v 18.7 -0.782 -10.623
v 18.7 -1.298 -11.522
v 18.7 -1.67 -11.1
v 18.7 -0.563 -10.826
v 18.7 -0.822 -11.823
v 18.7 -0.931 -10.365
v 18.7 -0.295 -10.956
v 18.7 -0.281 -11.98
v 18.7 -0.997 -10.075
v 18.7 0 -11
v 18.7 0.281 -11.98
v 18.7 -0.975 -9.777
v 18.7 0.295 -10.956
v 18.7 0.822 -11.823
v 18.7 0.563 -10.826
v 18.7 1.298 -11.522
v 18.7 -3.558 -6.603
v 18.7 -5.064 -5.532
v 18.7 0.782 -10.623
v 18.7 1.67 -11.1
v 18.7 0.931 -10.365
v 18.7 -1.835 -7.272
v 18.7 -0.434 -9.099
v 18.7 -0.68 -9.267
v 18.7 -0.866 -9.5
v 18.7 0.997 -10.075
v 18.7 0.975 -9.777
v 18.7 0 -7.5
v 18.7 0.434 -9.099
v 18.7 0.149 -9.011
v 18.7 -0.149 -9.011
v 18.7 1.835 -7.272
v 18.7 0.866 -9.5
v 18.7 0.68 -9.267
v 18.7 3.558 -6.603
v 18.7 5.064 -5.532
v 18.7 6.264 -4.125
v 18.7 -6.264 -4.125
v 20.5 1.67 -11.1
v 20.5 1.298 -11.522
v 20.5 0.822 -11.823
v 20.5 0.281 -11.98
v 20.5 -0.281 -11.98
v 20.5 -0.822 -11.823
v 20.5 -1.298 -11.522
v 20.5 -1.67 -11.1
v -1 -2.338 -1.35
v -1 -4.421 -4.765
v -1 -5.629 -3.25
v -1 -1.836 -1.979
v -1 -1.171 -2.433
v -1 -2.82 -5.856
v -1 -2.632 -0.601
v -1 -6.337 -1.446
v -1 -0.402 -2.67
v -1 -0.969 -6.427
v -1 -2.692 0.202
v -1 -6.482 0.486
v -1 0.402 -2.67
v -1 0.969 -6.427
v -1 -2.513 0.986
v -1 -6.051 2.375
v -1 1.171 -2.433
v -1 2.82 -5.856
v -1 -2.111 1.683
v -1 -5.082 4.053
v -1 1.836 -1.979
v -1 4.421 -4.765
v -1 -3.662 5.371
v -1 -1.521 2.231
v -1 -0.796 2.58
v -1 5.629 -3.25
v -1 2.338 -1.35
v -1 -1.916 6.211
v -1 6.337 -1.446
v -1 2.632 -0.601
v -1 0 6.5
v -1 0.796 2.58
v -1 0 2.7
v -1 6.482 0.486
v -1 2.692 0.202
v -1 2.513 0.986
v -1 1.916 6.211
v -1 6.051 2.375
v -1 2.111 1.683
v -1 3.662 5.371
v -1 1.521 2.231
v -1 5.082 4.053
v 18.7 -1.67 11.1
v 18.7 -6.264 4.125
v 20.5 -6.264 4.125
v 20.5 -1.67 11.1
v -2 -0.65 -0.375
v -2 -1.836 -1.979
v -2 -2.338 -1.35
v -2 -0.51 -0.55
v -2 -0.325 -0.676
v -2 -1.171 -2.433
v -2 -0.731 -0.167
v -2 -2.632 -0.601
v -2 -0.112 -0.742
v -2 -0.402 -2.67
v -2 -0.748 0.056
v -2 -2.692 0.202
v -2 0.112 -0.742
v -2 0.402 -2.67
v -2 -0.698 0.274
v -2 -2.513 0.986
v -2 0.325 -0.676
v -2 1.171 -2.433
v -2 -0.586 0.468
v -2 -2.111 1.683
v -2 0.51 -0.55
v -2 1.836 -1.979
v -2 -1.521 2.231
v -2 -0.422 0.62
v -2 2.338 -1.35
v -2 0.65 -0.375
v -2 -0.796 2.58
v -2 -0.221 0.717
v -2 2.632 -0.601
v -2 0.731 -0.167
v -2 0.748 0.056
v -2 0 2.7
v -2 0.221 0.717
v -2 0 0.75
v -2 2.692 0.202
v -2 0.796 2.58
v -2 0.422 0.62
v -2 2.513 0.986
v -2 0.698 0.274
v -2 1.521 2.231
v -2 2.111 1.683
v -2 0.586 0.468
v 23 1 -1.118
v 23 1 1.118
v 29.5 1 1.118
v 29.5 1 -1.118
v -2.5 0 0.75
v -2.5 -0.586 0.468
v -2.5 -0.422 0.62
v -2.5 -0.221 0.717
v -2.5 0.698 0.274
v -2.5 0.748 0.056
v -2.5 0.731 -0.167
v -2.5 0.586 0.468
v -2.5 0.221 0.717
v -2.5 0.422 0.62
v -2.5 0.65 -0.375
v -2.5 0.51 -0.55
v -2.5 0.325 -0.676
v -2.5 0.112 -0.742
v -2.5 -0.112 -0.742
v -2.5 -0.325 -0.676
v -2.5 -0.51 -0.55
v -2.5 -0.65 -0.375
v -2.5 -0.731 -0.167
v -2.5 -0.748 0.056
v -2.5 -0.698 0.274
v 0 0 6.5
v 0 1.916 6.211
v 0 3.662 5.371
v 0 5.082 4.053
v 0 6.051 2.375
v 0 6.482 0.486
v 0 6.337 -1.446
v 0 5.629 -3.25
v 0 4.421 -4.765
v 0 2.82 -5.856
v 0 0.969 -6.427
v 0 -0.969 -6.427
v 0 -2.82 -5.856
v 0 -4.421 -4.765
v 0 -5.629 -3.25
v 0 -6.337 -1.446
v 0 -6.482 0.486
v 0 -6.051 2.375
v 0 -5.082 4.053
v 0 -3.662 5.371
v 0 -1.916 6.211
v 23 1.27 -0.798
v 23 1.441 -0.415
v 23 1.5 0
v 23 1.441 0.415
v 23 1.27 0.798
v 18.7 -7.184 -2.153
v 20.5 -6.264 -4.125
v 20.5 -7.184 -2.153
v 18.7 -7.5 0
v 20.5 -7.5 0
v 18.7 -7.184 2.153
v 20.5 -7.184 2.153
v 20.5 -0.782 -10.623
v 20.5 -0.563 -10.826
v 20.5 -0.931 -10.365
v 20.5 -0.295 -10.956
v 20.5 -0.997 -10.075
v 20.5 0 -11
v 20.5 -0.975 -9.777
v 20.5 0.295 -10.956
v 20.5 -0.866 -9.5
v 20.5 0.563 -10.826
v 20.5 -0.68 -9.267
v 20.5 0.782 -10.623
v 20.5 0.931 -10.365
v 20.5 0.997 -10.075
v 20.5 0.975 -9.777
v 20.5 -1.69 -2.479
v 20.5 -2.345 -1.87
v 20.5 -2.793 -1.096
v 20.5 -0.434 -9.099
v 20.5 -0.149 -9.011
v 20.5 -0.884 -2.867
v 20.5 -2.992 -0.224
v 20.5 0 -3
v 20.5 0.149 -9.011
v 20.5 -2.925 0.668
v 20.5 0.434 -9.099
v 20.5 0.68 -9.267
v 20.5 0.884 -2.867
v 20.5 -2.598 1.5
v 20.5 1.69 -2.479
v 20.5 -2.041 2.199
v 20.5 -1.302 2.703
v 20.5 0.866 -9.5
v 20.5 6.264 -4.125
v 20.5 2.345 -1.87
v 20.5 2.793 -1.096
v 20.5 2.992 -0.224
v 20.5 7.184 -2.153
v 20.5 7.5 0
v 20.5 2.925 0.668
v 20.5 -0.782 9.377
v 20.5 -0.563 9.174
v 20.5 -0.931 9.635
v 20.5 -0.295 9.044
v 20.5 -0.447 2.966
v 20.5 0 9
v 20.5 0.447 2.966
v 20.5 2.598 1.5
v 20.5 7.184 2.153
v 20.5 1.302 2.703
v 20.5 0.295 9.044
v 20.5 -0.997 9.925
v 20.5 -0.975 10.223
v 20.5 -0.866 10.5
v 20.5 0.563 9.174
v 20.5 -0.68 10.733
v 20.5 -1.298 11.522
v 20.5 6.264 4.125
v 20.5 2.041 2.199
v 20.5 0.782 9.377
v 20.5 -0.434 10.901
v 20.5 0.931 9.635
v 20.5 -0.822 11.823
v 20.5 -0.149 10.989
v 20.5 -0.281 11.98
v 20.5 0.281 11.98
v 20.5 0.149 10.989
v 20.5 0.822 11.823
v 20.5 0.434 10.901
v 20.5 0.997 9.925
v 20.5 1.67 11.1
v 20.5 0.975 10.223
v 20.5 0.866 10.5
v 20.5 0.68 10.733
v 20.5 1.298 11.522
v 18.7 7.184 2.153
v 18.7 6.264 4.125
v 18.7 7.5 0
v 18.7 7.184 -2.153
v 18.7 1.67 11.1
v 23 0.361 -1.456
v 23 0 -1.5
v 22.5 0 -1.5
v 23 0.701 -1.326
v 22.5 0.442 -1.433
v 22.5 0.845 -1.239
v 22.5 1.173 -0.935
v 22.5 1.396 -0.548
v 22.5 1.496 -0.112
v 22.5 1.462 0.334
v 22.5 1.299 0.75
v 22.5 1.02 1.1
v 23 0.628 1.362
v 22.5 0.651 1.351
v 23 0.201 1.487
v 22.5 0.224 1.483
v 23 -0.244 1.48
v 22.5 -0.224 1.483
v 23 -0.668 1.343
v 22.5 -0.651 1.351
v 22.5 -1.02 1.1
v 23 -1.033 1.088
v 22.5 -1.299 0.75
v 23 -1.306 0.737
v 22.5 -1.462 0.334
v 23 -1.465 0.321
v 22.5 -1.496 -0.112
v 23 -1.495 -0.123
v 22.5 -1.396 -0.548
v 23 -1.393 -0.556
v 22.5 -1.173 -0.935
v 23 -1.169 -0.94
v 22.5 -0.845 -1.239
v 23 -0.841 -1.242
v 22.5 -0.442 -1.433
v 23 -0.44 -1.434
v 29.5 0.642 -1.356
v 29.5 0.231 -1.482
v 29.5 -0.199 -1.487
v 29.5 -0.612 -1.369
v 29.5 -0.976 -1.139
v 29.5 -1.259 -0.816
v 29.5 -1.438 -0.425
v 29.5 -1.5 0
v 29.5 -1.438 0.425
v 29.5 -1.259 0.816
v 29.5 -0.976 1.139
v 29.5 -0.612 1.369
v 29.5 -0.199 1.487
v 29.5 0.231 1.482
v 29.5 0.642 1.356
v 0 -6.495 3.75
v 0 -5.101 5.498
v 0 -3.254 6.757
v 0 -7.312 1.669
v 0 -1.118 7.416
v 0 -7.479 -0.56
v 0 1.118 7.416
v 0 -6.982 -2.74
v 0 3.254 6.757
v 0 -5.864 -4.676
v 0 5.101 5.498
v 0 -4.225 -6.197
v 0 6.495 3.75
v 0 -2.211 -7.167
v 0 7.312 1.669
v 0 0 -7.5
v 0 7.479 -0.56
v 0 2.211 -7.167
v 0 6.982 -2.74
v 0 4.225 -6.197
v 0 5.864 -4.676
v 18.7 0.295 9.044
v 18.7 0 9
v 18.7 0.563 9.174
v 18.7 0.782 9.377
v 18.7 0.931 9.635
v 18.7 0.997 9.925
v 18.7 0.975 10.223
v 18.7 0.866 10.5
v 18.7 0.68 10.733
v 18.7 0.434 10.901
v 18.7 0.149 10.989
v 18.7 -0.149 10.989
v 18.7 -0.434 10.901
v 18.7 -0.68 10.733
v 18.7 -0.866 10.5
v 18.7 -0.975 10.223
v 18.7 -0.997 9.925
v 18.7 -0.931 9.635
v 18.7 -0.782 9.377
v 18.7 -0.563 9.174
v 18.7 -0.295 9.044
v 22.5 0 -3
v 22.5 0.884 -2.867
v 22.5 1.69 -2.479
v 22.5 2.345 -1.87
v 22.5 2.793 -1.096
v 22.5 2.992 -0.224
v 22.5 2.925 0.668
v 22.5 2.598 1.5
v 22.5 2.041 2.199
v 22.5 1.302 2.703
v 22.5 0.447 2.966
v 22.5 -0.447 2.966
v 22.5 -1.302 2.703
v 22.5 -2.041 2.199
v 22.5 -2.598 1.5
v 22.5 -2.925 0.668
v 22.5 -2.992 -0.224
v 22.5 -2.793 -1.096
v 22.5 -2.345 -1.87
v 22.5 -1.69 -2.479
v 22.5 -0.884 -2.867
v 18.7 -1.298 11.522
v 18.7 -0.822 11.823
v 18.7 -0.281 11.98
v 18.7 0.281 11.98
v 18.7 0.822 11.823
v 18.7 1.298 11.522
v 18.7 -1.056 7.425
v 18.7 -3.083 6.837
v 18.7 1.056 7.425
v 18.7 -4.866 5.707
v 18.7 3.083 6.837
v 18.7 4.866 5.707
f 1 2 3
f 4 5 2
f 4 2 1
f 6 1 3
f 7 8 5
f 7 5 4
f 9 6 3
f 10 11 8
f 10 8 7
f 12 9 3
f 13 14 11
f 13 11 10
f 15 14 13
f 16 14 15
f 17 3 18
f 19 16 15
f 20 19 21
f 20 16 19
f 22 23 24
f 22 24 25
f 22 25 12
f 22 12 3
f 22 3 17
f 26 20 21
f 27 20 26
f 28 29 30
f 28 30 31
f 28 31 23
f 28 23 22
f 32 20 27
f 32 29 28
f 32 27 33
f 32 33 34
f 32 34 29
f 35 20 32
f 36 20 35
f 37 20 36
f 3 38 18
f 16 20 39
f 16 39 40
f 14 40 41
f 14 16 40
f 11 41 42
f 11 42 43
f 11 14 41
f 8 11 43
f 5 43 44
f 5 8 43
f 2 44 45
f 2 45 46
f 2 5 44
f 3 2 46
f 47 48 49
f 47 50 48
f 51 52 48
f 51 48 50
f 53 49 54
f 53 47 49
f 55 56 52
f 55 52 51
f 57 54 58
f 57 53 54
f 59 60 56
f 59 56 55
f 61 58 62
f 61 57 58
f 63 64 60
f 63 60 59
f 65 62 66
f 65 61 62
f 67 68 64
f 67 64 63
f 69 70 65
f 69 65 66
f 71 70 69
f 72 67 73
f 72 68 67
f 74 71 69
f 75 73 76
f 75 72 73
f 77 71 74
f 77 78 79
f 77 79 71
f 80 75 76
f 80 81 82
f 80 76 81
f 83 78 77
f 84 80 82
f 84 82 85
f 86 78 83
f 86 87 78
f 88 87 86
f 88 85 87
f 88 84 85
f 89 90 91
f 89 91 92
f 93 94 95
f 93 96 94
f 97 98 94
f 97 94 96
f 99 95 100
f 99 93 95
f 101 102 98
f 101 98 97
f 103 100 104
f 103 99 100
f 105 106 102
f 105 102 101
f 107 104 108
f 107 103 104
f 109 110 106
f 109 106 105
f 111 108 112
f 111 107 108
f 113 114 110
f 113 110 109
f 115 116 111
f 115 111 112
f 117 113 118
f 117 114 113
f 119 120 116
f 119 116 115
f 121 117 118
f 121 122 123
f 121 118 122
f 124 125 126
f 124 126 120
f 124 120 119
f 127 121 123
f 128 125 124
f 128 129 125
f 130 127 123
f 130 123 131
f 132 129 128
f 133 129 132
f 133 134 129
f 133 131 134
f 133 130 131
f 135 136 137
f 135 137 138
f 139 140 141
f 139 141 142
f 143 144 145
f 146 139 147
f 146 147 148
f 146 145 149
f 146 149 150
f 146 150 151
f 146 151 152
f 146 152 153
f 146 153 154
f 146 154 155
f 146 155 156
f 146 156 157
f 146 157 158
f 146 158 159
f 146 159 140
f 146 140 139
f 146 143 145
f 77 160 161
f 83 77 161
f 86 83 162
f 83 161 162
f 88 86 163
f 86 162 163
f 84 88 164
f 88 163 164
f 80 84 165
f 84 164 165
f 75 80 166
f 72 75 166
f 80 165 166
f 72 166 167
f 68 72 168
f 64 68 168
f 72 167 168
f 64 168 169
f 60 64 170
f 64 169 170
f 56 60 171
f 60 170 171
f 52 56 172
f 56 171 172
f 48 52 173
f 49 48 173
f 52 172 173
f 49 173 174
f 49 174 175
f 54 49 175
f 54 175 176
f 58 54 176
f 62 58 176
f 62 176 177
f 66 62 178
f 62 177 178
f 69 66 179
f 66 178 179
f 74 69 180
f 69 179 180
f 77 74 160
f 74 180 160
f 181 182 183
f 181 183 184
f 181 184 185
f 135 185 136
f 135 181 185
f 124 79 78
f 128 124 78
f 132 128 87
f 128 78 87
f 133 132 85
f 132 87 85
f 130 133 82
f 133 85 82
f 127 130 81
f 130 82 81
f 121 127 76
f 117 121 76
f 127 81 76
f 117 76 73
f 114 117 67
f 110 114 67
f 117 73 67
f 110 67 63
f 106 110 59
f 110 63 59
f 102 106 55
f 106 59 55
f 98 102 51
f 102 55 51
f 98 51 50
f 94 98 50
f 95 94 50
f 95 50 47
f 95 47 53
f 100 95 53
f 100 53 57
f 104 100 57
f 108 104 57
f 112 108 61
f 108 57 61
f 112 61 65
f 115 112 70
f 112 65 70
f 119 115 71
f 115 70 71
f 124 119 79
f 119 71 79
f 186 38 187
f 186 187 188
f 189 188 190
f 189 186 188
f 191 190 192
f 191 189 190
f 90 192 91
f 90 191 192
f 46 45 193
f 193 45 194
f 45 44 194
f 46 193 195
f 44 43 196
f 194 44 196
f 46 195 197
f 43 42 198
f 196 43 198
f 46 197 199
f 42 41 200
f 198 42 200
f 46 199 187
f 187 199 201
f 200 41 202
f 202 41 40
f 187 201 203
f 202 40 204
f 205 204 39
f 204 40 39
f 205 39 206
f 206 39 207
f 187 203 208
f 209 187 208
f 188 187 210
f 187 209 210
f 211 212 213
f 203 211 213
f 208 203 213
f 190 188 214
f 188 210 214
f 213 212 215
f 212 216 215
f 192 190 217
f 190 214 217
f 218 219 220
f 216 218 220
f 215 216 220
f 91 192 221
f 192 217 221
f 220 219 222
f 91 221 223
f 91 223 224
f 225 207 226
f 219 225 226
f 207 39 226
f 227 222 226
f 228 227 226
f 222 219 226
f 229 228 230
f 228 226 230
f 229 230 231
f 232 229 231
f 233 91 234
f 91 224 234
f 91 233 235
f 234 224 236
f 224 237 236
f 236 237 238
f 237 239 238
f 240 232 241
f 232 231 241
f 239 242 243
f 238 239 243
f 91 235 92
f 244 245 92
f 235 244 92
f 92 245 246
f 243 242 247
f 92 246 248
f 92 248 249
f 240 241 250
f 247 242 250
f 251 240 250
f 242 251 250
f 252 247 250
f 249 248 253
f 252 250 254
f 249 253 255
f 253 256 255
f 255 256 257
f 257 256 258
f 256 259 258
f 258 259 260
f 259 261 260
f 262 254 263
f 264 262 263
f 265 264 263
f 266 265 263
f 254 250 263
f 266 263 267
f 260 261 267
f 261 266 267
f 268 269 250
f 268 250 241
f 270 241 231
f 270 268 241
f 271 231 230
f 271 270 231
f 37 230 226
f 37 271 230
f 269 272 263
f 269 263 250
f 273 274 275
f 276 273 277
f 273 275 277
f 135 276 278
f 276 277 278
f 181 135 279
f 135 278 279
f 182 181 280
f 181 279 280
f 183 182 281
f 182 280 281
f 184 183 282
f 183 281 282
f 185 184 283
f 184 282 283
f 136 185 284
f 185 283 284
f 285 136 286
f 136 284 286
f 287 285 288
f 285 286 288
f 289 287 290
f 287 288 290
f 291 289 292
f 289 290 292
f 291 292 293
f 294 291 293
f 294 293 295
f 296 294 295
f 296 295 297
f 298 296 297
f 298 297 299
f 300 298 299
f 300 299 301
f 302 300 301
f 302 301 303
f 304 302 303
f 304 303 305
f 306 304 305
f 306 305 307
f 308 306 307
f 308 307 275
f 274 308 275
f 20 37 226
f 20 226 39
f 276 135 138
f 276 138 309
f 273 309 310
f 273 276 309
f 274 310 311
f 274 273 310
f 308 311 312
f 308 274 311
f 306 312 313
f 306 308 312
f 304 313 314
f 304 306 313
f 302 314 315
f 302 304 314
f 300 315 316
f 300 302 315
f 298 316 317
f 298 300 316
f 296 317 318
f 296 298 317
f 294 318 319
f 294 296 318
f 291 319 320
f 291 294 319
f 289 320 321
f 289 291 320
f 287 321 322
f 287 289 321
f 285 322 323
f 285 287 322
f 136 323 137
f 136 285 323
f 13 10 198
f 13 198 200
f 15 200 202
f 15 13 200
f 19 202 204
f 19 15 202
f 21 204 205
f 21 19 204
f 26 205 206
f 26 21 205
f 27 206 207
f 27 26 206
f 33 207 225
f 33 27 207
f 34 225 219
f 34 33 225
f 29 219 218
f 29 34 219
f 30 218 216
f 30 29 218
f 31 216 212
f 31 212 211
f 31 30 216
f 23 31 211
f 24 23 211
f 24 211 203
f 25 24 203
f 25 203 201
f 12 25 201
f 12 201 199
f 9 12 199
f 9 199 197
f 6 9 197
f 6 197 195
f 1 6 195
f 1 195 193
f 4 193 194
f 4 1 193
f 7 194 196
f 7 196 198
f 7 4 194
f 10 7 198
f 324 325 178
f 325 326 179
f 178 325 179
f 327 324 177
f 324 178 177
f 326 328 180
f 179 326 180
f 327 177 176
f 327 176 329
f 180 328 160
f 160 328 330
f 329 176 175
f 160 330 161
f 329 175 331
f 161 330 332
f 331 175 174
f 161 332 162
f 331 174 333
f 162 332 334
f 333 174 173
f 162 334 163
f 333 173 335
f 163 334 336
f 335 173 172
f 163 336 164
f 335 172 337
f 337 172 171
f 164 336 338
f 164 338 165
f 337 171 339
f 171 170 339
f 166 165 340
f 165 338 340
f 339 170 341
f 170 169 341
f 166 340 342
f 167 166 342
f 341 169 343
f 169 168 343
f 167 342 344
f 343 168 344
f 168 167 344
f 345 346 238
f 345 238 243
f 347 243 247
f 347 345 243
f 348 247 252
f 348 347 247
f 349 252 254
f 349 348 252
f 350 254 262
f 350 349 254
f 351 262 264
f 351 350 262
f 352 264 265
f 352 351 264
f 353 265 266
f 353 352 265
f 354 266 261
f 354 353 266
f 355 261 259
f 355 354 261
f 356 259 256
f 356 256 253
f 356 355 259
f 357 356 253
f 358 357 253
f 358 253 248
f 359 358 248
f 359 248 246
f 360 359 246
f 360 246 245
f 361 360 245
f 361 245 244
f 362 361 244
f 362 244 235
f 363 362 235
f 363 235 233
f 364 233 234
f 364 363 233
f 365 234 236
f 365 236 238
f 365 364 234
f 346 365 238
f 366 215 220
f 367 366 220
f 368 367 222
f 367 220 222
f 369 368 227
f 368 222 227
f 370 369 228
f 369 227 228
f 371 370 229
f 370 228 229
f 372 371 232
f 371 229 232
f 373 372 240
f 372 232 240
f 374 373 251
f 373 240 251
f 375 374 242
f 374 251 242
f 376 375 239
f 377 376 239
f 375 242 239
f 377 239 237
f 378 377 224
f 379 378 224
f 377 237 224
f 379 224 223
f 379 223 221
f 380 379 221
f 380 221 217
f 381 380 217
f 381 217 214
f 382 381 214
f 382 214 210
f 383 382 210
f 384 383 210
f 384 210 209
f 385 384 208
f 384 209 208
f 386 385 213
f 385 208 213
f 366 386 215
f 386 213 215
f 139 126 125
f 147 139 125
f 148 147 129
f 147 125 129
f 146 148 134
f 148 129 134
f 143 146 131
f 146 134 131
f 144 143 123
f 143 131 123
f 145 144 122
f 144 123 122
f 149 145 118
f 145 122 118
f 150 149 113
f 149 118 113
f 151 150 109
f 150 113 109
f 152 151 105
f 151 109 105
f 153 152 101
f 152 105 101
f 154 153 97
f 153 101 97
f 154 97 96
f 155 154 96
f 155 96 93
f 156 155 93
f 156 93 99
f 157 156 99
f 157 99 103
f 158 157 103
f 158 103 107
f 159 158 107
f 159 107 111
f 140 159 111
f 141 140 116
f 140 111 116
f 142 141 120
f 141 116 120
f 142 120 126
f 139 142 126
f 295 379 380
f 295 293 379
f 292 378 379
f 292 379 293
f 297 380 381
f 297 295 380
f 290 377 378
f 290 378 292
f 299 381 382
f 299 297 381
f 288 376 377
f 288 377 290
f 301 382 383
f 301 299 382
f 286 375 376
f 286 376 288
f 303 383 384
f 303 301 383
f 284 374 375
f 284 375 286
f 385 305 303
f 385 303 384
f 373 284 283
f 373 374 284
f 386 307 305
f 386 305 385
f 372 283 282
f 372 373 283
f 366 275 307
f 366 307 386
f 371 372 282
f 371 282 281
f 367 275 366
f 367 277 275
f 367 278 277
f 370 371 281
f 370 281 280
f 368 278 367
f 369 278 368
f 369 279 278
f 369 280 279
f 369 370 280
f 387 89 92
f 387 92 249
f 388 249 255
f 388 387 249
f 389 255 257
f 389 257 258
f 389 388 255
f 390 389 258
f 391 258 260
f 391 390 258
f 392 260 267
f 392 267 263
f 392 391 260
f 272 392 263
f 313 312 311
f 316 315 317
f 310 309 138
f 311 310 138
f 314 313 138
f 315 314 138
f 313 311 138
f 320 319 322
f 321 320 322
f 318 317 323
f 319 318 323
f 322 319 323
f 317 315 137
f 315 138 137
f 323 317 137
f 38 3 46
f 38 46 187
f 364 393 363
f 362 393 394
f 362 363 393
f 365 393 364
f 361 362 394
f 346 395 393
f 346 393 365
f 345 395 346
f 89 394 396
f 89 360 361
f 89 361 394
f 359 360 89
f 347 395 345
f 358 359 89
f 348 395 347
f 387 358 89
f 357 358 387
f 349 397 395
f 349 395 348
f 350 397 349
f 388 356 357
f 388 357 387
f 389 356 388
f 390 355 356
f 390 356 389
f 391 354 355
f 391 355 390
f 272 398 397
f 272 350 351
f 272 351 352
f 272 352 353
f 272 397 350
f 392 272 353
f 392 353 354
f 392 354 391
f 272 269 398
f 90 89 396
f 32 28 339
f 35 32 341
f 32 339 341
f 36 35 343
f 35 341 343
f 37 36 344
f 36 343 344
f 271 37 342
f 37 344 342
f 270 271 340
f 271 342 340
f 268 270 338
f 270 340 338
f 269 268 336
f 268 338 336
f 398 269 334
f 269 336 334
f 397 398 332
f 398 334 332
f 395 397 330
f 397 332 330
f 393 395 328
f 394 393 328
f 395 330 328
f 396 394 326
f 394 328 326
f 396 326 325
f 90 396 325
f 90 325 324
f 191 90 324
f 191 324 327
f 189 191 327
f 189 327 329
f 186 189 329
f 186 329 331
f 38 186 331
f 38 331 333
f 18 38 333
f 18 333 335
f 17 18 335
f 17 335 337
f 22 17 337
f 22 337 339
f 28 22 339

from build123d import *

# Parameters (mm, degrees)
SKETCH_1_R      = 7.5
EXTRUDE_1_DEPTH = 18.7
SKETCH_2_R      = 1
EXTRUDE_2_DEPTH = 1.8
SKETCH_3_R      = 6.5
EXTRUDE_3_DEPTH = 1
SKETCH_4_R      = 2.7
EXTRUDE_4_DEPTH = 1
SKETCH_5_R      = 0.75
EXTRUDE_5_DEPTH = 0.5
SKETCH_6_R      = 3
EXTRUDE_6_DEPTH = 2
SKETCH_7_R      = 1.5
EXTRUDE_7_DEPTH = 0.5
EXTRUDE_8_DEPTH = 6.5


with BuildPart() as part:
    # 草图1 → 凸台-拉伸1 (new body)
    with BuildSketch(Plane(origin=(0, 0, 0), x_dir=(0, 0, -1), z_dir=(1, 0, 0))):
        Circle(SKETCH_1_R)
    extrude(amount=EXTRUDE_1_DEPTH)

    # 草图2 → 凸台-拉伸2 (add)
    with BuildSketch(Plane(origin=(18.7, 0, 0), x_dir=(0, 0, -1), z_dir=(1, 0, 0))):
        with BuildLine():
            Line((4.125, 6.263734908), (11.1, 1.670329309))
            ThreePointArc((11.1, 1.670329309), (12, 0), (11.1, -1.670329309))
            Line((11.1, -1.670329309), (4.125, -6.263734908))
            ThreePointArc((4.125, -6.263734908), (0, -7.5), (-4.125, -6.263734908))
            Line((-4.125, -6.263734908), (-11.1, -1.670329309))
            ThreePointArc((-11.1, -1.670329309), (-12, 0), (-11.1, 1.670329309))
            Line((-11.1, 1.670329309), (-4.125, 6.263734908))
            ThreePointArc((-4.125, 6.263734908), (0, 7.5), (4.125, 6.263734908))
        make_face()
        with Locations((10, 0)):
            Circle(SKETCH_2_R, mode=Mode.SUBTRACT)
        with Locations((-10, 0)):
            Circle(SKETCH_2_R, mode=Mode.SUBTRACT)
    extrude(amount=EXTRUDE_2_DEPTH)

    # 草图3 → 凸台-拉伸3 (add)
    with BuildSketch(Plane.ZY):
        Circle(SKETCH_3_R)
    extrude(amount=EXTRUDE_3_DEPTH)

    # 草图4 → 凸台-拉伸4 (add)
    with BuildSketch(Plane.ZY.offset(1)):
        Circle(SKETCH_4_R)
    extrude(amount=EXTRUDE_4_DEPTH)

    # 草图5 → 凸台-拉伸5 (add)
    with BuildSketch(Plane.ZY.offset(2)):
        Circle(SKETCH_5_R)
    extrude(amount=EXTRUDE_5_DEPTH)

    # 草图6 → 凸台-拉伸6 (add)
    with BuildSketch(Plane(origin=(20.5, 0, 0), x_dir=(0, 0, -1), z_dir=(1, 0, 0))):
        Circle(SKETCH_6_R)
    extrude(amount=EXTRUDE_6_DEPTH)

    # 草图7 → 凸台-拉伸7 (add)
    with BuildSketch(Plane(origin=(22.5, 0, 0), x_dir=(0, 0, -1), z_dir=(1, 0, 0))):
        Circle(SKETCH_7_R)
    extrude(amount=EXTRUDE_7_DEPTH)

    # 草图8 → 凸台-拉伸8 (add)
    with BuildSketch(Plane(origin=(23, 0, 0), x_dir=(0, 0, -1), z_dir=(1, 0, 0))):
        with BuildLine():
            Line((0, 1), (1.118033989, 1))
            ThreePointArc((1.118033989, 1), (0, -1.5), (-1.118033989, 1))
            Line((-1.118033989, 1), (0, 1))
        make_face()
    extrude(amount=EXTRUDE_8_DEPTH)


solid = part.part
